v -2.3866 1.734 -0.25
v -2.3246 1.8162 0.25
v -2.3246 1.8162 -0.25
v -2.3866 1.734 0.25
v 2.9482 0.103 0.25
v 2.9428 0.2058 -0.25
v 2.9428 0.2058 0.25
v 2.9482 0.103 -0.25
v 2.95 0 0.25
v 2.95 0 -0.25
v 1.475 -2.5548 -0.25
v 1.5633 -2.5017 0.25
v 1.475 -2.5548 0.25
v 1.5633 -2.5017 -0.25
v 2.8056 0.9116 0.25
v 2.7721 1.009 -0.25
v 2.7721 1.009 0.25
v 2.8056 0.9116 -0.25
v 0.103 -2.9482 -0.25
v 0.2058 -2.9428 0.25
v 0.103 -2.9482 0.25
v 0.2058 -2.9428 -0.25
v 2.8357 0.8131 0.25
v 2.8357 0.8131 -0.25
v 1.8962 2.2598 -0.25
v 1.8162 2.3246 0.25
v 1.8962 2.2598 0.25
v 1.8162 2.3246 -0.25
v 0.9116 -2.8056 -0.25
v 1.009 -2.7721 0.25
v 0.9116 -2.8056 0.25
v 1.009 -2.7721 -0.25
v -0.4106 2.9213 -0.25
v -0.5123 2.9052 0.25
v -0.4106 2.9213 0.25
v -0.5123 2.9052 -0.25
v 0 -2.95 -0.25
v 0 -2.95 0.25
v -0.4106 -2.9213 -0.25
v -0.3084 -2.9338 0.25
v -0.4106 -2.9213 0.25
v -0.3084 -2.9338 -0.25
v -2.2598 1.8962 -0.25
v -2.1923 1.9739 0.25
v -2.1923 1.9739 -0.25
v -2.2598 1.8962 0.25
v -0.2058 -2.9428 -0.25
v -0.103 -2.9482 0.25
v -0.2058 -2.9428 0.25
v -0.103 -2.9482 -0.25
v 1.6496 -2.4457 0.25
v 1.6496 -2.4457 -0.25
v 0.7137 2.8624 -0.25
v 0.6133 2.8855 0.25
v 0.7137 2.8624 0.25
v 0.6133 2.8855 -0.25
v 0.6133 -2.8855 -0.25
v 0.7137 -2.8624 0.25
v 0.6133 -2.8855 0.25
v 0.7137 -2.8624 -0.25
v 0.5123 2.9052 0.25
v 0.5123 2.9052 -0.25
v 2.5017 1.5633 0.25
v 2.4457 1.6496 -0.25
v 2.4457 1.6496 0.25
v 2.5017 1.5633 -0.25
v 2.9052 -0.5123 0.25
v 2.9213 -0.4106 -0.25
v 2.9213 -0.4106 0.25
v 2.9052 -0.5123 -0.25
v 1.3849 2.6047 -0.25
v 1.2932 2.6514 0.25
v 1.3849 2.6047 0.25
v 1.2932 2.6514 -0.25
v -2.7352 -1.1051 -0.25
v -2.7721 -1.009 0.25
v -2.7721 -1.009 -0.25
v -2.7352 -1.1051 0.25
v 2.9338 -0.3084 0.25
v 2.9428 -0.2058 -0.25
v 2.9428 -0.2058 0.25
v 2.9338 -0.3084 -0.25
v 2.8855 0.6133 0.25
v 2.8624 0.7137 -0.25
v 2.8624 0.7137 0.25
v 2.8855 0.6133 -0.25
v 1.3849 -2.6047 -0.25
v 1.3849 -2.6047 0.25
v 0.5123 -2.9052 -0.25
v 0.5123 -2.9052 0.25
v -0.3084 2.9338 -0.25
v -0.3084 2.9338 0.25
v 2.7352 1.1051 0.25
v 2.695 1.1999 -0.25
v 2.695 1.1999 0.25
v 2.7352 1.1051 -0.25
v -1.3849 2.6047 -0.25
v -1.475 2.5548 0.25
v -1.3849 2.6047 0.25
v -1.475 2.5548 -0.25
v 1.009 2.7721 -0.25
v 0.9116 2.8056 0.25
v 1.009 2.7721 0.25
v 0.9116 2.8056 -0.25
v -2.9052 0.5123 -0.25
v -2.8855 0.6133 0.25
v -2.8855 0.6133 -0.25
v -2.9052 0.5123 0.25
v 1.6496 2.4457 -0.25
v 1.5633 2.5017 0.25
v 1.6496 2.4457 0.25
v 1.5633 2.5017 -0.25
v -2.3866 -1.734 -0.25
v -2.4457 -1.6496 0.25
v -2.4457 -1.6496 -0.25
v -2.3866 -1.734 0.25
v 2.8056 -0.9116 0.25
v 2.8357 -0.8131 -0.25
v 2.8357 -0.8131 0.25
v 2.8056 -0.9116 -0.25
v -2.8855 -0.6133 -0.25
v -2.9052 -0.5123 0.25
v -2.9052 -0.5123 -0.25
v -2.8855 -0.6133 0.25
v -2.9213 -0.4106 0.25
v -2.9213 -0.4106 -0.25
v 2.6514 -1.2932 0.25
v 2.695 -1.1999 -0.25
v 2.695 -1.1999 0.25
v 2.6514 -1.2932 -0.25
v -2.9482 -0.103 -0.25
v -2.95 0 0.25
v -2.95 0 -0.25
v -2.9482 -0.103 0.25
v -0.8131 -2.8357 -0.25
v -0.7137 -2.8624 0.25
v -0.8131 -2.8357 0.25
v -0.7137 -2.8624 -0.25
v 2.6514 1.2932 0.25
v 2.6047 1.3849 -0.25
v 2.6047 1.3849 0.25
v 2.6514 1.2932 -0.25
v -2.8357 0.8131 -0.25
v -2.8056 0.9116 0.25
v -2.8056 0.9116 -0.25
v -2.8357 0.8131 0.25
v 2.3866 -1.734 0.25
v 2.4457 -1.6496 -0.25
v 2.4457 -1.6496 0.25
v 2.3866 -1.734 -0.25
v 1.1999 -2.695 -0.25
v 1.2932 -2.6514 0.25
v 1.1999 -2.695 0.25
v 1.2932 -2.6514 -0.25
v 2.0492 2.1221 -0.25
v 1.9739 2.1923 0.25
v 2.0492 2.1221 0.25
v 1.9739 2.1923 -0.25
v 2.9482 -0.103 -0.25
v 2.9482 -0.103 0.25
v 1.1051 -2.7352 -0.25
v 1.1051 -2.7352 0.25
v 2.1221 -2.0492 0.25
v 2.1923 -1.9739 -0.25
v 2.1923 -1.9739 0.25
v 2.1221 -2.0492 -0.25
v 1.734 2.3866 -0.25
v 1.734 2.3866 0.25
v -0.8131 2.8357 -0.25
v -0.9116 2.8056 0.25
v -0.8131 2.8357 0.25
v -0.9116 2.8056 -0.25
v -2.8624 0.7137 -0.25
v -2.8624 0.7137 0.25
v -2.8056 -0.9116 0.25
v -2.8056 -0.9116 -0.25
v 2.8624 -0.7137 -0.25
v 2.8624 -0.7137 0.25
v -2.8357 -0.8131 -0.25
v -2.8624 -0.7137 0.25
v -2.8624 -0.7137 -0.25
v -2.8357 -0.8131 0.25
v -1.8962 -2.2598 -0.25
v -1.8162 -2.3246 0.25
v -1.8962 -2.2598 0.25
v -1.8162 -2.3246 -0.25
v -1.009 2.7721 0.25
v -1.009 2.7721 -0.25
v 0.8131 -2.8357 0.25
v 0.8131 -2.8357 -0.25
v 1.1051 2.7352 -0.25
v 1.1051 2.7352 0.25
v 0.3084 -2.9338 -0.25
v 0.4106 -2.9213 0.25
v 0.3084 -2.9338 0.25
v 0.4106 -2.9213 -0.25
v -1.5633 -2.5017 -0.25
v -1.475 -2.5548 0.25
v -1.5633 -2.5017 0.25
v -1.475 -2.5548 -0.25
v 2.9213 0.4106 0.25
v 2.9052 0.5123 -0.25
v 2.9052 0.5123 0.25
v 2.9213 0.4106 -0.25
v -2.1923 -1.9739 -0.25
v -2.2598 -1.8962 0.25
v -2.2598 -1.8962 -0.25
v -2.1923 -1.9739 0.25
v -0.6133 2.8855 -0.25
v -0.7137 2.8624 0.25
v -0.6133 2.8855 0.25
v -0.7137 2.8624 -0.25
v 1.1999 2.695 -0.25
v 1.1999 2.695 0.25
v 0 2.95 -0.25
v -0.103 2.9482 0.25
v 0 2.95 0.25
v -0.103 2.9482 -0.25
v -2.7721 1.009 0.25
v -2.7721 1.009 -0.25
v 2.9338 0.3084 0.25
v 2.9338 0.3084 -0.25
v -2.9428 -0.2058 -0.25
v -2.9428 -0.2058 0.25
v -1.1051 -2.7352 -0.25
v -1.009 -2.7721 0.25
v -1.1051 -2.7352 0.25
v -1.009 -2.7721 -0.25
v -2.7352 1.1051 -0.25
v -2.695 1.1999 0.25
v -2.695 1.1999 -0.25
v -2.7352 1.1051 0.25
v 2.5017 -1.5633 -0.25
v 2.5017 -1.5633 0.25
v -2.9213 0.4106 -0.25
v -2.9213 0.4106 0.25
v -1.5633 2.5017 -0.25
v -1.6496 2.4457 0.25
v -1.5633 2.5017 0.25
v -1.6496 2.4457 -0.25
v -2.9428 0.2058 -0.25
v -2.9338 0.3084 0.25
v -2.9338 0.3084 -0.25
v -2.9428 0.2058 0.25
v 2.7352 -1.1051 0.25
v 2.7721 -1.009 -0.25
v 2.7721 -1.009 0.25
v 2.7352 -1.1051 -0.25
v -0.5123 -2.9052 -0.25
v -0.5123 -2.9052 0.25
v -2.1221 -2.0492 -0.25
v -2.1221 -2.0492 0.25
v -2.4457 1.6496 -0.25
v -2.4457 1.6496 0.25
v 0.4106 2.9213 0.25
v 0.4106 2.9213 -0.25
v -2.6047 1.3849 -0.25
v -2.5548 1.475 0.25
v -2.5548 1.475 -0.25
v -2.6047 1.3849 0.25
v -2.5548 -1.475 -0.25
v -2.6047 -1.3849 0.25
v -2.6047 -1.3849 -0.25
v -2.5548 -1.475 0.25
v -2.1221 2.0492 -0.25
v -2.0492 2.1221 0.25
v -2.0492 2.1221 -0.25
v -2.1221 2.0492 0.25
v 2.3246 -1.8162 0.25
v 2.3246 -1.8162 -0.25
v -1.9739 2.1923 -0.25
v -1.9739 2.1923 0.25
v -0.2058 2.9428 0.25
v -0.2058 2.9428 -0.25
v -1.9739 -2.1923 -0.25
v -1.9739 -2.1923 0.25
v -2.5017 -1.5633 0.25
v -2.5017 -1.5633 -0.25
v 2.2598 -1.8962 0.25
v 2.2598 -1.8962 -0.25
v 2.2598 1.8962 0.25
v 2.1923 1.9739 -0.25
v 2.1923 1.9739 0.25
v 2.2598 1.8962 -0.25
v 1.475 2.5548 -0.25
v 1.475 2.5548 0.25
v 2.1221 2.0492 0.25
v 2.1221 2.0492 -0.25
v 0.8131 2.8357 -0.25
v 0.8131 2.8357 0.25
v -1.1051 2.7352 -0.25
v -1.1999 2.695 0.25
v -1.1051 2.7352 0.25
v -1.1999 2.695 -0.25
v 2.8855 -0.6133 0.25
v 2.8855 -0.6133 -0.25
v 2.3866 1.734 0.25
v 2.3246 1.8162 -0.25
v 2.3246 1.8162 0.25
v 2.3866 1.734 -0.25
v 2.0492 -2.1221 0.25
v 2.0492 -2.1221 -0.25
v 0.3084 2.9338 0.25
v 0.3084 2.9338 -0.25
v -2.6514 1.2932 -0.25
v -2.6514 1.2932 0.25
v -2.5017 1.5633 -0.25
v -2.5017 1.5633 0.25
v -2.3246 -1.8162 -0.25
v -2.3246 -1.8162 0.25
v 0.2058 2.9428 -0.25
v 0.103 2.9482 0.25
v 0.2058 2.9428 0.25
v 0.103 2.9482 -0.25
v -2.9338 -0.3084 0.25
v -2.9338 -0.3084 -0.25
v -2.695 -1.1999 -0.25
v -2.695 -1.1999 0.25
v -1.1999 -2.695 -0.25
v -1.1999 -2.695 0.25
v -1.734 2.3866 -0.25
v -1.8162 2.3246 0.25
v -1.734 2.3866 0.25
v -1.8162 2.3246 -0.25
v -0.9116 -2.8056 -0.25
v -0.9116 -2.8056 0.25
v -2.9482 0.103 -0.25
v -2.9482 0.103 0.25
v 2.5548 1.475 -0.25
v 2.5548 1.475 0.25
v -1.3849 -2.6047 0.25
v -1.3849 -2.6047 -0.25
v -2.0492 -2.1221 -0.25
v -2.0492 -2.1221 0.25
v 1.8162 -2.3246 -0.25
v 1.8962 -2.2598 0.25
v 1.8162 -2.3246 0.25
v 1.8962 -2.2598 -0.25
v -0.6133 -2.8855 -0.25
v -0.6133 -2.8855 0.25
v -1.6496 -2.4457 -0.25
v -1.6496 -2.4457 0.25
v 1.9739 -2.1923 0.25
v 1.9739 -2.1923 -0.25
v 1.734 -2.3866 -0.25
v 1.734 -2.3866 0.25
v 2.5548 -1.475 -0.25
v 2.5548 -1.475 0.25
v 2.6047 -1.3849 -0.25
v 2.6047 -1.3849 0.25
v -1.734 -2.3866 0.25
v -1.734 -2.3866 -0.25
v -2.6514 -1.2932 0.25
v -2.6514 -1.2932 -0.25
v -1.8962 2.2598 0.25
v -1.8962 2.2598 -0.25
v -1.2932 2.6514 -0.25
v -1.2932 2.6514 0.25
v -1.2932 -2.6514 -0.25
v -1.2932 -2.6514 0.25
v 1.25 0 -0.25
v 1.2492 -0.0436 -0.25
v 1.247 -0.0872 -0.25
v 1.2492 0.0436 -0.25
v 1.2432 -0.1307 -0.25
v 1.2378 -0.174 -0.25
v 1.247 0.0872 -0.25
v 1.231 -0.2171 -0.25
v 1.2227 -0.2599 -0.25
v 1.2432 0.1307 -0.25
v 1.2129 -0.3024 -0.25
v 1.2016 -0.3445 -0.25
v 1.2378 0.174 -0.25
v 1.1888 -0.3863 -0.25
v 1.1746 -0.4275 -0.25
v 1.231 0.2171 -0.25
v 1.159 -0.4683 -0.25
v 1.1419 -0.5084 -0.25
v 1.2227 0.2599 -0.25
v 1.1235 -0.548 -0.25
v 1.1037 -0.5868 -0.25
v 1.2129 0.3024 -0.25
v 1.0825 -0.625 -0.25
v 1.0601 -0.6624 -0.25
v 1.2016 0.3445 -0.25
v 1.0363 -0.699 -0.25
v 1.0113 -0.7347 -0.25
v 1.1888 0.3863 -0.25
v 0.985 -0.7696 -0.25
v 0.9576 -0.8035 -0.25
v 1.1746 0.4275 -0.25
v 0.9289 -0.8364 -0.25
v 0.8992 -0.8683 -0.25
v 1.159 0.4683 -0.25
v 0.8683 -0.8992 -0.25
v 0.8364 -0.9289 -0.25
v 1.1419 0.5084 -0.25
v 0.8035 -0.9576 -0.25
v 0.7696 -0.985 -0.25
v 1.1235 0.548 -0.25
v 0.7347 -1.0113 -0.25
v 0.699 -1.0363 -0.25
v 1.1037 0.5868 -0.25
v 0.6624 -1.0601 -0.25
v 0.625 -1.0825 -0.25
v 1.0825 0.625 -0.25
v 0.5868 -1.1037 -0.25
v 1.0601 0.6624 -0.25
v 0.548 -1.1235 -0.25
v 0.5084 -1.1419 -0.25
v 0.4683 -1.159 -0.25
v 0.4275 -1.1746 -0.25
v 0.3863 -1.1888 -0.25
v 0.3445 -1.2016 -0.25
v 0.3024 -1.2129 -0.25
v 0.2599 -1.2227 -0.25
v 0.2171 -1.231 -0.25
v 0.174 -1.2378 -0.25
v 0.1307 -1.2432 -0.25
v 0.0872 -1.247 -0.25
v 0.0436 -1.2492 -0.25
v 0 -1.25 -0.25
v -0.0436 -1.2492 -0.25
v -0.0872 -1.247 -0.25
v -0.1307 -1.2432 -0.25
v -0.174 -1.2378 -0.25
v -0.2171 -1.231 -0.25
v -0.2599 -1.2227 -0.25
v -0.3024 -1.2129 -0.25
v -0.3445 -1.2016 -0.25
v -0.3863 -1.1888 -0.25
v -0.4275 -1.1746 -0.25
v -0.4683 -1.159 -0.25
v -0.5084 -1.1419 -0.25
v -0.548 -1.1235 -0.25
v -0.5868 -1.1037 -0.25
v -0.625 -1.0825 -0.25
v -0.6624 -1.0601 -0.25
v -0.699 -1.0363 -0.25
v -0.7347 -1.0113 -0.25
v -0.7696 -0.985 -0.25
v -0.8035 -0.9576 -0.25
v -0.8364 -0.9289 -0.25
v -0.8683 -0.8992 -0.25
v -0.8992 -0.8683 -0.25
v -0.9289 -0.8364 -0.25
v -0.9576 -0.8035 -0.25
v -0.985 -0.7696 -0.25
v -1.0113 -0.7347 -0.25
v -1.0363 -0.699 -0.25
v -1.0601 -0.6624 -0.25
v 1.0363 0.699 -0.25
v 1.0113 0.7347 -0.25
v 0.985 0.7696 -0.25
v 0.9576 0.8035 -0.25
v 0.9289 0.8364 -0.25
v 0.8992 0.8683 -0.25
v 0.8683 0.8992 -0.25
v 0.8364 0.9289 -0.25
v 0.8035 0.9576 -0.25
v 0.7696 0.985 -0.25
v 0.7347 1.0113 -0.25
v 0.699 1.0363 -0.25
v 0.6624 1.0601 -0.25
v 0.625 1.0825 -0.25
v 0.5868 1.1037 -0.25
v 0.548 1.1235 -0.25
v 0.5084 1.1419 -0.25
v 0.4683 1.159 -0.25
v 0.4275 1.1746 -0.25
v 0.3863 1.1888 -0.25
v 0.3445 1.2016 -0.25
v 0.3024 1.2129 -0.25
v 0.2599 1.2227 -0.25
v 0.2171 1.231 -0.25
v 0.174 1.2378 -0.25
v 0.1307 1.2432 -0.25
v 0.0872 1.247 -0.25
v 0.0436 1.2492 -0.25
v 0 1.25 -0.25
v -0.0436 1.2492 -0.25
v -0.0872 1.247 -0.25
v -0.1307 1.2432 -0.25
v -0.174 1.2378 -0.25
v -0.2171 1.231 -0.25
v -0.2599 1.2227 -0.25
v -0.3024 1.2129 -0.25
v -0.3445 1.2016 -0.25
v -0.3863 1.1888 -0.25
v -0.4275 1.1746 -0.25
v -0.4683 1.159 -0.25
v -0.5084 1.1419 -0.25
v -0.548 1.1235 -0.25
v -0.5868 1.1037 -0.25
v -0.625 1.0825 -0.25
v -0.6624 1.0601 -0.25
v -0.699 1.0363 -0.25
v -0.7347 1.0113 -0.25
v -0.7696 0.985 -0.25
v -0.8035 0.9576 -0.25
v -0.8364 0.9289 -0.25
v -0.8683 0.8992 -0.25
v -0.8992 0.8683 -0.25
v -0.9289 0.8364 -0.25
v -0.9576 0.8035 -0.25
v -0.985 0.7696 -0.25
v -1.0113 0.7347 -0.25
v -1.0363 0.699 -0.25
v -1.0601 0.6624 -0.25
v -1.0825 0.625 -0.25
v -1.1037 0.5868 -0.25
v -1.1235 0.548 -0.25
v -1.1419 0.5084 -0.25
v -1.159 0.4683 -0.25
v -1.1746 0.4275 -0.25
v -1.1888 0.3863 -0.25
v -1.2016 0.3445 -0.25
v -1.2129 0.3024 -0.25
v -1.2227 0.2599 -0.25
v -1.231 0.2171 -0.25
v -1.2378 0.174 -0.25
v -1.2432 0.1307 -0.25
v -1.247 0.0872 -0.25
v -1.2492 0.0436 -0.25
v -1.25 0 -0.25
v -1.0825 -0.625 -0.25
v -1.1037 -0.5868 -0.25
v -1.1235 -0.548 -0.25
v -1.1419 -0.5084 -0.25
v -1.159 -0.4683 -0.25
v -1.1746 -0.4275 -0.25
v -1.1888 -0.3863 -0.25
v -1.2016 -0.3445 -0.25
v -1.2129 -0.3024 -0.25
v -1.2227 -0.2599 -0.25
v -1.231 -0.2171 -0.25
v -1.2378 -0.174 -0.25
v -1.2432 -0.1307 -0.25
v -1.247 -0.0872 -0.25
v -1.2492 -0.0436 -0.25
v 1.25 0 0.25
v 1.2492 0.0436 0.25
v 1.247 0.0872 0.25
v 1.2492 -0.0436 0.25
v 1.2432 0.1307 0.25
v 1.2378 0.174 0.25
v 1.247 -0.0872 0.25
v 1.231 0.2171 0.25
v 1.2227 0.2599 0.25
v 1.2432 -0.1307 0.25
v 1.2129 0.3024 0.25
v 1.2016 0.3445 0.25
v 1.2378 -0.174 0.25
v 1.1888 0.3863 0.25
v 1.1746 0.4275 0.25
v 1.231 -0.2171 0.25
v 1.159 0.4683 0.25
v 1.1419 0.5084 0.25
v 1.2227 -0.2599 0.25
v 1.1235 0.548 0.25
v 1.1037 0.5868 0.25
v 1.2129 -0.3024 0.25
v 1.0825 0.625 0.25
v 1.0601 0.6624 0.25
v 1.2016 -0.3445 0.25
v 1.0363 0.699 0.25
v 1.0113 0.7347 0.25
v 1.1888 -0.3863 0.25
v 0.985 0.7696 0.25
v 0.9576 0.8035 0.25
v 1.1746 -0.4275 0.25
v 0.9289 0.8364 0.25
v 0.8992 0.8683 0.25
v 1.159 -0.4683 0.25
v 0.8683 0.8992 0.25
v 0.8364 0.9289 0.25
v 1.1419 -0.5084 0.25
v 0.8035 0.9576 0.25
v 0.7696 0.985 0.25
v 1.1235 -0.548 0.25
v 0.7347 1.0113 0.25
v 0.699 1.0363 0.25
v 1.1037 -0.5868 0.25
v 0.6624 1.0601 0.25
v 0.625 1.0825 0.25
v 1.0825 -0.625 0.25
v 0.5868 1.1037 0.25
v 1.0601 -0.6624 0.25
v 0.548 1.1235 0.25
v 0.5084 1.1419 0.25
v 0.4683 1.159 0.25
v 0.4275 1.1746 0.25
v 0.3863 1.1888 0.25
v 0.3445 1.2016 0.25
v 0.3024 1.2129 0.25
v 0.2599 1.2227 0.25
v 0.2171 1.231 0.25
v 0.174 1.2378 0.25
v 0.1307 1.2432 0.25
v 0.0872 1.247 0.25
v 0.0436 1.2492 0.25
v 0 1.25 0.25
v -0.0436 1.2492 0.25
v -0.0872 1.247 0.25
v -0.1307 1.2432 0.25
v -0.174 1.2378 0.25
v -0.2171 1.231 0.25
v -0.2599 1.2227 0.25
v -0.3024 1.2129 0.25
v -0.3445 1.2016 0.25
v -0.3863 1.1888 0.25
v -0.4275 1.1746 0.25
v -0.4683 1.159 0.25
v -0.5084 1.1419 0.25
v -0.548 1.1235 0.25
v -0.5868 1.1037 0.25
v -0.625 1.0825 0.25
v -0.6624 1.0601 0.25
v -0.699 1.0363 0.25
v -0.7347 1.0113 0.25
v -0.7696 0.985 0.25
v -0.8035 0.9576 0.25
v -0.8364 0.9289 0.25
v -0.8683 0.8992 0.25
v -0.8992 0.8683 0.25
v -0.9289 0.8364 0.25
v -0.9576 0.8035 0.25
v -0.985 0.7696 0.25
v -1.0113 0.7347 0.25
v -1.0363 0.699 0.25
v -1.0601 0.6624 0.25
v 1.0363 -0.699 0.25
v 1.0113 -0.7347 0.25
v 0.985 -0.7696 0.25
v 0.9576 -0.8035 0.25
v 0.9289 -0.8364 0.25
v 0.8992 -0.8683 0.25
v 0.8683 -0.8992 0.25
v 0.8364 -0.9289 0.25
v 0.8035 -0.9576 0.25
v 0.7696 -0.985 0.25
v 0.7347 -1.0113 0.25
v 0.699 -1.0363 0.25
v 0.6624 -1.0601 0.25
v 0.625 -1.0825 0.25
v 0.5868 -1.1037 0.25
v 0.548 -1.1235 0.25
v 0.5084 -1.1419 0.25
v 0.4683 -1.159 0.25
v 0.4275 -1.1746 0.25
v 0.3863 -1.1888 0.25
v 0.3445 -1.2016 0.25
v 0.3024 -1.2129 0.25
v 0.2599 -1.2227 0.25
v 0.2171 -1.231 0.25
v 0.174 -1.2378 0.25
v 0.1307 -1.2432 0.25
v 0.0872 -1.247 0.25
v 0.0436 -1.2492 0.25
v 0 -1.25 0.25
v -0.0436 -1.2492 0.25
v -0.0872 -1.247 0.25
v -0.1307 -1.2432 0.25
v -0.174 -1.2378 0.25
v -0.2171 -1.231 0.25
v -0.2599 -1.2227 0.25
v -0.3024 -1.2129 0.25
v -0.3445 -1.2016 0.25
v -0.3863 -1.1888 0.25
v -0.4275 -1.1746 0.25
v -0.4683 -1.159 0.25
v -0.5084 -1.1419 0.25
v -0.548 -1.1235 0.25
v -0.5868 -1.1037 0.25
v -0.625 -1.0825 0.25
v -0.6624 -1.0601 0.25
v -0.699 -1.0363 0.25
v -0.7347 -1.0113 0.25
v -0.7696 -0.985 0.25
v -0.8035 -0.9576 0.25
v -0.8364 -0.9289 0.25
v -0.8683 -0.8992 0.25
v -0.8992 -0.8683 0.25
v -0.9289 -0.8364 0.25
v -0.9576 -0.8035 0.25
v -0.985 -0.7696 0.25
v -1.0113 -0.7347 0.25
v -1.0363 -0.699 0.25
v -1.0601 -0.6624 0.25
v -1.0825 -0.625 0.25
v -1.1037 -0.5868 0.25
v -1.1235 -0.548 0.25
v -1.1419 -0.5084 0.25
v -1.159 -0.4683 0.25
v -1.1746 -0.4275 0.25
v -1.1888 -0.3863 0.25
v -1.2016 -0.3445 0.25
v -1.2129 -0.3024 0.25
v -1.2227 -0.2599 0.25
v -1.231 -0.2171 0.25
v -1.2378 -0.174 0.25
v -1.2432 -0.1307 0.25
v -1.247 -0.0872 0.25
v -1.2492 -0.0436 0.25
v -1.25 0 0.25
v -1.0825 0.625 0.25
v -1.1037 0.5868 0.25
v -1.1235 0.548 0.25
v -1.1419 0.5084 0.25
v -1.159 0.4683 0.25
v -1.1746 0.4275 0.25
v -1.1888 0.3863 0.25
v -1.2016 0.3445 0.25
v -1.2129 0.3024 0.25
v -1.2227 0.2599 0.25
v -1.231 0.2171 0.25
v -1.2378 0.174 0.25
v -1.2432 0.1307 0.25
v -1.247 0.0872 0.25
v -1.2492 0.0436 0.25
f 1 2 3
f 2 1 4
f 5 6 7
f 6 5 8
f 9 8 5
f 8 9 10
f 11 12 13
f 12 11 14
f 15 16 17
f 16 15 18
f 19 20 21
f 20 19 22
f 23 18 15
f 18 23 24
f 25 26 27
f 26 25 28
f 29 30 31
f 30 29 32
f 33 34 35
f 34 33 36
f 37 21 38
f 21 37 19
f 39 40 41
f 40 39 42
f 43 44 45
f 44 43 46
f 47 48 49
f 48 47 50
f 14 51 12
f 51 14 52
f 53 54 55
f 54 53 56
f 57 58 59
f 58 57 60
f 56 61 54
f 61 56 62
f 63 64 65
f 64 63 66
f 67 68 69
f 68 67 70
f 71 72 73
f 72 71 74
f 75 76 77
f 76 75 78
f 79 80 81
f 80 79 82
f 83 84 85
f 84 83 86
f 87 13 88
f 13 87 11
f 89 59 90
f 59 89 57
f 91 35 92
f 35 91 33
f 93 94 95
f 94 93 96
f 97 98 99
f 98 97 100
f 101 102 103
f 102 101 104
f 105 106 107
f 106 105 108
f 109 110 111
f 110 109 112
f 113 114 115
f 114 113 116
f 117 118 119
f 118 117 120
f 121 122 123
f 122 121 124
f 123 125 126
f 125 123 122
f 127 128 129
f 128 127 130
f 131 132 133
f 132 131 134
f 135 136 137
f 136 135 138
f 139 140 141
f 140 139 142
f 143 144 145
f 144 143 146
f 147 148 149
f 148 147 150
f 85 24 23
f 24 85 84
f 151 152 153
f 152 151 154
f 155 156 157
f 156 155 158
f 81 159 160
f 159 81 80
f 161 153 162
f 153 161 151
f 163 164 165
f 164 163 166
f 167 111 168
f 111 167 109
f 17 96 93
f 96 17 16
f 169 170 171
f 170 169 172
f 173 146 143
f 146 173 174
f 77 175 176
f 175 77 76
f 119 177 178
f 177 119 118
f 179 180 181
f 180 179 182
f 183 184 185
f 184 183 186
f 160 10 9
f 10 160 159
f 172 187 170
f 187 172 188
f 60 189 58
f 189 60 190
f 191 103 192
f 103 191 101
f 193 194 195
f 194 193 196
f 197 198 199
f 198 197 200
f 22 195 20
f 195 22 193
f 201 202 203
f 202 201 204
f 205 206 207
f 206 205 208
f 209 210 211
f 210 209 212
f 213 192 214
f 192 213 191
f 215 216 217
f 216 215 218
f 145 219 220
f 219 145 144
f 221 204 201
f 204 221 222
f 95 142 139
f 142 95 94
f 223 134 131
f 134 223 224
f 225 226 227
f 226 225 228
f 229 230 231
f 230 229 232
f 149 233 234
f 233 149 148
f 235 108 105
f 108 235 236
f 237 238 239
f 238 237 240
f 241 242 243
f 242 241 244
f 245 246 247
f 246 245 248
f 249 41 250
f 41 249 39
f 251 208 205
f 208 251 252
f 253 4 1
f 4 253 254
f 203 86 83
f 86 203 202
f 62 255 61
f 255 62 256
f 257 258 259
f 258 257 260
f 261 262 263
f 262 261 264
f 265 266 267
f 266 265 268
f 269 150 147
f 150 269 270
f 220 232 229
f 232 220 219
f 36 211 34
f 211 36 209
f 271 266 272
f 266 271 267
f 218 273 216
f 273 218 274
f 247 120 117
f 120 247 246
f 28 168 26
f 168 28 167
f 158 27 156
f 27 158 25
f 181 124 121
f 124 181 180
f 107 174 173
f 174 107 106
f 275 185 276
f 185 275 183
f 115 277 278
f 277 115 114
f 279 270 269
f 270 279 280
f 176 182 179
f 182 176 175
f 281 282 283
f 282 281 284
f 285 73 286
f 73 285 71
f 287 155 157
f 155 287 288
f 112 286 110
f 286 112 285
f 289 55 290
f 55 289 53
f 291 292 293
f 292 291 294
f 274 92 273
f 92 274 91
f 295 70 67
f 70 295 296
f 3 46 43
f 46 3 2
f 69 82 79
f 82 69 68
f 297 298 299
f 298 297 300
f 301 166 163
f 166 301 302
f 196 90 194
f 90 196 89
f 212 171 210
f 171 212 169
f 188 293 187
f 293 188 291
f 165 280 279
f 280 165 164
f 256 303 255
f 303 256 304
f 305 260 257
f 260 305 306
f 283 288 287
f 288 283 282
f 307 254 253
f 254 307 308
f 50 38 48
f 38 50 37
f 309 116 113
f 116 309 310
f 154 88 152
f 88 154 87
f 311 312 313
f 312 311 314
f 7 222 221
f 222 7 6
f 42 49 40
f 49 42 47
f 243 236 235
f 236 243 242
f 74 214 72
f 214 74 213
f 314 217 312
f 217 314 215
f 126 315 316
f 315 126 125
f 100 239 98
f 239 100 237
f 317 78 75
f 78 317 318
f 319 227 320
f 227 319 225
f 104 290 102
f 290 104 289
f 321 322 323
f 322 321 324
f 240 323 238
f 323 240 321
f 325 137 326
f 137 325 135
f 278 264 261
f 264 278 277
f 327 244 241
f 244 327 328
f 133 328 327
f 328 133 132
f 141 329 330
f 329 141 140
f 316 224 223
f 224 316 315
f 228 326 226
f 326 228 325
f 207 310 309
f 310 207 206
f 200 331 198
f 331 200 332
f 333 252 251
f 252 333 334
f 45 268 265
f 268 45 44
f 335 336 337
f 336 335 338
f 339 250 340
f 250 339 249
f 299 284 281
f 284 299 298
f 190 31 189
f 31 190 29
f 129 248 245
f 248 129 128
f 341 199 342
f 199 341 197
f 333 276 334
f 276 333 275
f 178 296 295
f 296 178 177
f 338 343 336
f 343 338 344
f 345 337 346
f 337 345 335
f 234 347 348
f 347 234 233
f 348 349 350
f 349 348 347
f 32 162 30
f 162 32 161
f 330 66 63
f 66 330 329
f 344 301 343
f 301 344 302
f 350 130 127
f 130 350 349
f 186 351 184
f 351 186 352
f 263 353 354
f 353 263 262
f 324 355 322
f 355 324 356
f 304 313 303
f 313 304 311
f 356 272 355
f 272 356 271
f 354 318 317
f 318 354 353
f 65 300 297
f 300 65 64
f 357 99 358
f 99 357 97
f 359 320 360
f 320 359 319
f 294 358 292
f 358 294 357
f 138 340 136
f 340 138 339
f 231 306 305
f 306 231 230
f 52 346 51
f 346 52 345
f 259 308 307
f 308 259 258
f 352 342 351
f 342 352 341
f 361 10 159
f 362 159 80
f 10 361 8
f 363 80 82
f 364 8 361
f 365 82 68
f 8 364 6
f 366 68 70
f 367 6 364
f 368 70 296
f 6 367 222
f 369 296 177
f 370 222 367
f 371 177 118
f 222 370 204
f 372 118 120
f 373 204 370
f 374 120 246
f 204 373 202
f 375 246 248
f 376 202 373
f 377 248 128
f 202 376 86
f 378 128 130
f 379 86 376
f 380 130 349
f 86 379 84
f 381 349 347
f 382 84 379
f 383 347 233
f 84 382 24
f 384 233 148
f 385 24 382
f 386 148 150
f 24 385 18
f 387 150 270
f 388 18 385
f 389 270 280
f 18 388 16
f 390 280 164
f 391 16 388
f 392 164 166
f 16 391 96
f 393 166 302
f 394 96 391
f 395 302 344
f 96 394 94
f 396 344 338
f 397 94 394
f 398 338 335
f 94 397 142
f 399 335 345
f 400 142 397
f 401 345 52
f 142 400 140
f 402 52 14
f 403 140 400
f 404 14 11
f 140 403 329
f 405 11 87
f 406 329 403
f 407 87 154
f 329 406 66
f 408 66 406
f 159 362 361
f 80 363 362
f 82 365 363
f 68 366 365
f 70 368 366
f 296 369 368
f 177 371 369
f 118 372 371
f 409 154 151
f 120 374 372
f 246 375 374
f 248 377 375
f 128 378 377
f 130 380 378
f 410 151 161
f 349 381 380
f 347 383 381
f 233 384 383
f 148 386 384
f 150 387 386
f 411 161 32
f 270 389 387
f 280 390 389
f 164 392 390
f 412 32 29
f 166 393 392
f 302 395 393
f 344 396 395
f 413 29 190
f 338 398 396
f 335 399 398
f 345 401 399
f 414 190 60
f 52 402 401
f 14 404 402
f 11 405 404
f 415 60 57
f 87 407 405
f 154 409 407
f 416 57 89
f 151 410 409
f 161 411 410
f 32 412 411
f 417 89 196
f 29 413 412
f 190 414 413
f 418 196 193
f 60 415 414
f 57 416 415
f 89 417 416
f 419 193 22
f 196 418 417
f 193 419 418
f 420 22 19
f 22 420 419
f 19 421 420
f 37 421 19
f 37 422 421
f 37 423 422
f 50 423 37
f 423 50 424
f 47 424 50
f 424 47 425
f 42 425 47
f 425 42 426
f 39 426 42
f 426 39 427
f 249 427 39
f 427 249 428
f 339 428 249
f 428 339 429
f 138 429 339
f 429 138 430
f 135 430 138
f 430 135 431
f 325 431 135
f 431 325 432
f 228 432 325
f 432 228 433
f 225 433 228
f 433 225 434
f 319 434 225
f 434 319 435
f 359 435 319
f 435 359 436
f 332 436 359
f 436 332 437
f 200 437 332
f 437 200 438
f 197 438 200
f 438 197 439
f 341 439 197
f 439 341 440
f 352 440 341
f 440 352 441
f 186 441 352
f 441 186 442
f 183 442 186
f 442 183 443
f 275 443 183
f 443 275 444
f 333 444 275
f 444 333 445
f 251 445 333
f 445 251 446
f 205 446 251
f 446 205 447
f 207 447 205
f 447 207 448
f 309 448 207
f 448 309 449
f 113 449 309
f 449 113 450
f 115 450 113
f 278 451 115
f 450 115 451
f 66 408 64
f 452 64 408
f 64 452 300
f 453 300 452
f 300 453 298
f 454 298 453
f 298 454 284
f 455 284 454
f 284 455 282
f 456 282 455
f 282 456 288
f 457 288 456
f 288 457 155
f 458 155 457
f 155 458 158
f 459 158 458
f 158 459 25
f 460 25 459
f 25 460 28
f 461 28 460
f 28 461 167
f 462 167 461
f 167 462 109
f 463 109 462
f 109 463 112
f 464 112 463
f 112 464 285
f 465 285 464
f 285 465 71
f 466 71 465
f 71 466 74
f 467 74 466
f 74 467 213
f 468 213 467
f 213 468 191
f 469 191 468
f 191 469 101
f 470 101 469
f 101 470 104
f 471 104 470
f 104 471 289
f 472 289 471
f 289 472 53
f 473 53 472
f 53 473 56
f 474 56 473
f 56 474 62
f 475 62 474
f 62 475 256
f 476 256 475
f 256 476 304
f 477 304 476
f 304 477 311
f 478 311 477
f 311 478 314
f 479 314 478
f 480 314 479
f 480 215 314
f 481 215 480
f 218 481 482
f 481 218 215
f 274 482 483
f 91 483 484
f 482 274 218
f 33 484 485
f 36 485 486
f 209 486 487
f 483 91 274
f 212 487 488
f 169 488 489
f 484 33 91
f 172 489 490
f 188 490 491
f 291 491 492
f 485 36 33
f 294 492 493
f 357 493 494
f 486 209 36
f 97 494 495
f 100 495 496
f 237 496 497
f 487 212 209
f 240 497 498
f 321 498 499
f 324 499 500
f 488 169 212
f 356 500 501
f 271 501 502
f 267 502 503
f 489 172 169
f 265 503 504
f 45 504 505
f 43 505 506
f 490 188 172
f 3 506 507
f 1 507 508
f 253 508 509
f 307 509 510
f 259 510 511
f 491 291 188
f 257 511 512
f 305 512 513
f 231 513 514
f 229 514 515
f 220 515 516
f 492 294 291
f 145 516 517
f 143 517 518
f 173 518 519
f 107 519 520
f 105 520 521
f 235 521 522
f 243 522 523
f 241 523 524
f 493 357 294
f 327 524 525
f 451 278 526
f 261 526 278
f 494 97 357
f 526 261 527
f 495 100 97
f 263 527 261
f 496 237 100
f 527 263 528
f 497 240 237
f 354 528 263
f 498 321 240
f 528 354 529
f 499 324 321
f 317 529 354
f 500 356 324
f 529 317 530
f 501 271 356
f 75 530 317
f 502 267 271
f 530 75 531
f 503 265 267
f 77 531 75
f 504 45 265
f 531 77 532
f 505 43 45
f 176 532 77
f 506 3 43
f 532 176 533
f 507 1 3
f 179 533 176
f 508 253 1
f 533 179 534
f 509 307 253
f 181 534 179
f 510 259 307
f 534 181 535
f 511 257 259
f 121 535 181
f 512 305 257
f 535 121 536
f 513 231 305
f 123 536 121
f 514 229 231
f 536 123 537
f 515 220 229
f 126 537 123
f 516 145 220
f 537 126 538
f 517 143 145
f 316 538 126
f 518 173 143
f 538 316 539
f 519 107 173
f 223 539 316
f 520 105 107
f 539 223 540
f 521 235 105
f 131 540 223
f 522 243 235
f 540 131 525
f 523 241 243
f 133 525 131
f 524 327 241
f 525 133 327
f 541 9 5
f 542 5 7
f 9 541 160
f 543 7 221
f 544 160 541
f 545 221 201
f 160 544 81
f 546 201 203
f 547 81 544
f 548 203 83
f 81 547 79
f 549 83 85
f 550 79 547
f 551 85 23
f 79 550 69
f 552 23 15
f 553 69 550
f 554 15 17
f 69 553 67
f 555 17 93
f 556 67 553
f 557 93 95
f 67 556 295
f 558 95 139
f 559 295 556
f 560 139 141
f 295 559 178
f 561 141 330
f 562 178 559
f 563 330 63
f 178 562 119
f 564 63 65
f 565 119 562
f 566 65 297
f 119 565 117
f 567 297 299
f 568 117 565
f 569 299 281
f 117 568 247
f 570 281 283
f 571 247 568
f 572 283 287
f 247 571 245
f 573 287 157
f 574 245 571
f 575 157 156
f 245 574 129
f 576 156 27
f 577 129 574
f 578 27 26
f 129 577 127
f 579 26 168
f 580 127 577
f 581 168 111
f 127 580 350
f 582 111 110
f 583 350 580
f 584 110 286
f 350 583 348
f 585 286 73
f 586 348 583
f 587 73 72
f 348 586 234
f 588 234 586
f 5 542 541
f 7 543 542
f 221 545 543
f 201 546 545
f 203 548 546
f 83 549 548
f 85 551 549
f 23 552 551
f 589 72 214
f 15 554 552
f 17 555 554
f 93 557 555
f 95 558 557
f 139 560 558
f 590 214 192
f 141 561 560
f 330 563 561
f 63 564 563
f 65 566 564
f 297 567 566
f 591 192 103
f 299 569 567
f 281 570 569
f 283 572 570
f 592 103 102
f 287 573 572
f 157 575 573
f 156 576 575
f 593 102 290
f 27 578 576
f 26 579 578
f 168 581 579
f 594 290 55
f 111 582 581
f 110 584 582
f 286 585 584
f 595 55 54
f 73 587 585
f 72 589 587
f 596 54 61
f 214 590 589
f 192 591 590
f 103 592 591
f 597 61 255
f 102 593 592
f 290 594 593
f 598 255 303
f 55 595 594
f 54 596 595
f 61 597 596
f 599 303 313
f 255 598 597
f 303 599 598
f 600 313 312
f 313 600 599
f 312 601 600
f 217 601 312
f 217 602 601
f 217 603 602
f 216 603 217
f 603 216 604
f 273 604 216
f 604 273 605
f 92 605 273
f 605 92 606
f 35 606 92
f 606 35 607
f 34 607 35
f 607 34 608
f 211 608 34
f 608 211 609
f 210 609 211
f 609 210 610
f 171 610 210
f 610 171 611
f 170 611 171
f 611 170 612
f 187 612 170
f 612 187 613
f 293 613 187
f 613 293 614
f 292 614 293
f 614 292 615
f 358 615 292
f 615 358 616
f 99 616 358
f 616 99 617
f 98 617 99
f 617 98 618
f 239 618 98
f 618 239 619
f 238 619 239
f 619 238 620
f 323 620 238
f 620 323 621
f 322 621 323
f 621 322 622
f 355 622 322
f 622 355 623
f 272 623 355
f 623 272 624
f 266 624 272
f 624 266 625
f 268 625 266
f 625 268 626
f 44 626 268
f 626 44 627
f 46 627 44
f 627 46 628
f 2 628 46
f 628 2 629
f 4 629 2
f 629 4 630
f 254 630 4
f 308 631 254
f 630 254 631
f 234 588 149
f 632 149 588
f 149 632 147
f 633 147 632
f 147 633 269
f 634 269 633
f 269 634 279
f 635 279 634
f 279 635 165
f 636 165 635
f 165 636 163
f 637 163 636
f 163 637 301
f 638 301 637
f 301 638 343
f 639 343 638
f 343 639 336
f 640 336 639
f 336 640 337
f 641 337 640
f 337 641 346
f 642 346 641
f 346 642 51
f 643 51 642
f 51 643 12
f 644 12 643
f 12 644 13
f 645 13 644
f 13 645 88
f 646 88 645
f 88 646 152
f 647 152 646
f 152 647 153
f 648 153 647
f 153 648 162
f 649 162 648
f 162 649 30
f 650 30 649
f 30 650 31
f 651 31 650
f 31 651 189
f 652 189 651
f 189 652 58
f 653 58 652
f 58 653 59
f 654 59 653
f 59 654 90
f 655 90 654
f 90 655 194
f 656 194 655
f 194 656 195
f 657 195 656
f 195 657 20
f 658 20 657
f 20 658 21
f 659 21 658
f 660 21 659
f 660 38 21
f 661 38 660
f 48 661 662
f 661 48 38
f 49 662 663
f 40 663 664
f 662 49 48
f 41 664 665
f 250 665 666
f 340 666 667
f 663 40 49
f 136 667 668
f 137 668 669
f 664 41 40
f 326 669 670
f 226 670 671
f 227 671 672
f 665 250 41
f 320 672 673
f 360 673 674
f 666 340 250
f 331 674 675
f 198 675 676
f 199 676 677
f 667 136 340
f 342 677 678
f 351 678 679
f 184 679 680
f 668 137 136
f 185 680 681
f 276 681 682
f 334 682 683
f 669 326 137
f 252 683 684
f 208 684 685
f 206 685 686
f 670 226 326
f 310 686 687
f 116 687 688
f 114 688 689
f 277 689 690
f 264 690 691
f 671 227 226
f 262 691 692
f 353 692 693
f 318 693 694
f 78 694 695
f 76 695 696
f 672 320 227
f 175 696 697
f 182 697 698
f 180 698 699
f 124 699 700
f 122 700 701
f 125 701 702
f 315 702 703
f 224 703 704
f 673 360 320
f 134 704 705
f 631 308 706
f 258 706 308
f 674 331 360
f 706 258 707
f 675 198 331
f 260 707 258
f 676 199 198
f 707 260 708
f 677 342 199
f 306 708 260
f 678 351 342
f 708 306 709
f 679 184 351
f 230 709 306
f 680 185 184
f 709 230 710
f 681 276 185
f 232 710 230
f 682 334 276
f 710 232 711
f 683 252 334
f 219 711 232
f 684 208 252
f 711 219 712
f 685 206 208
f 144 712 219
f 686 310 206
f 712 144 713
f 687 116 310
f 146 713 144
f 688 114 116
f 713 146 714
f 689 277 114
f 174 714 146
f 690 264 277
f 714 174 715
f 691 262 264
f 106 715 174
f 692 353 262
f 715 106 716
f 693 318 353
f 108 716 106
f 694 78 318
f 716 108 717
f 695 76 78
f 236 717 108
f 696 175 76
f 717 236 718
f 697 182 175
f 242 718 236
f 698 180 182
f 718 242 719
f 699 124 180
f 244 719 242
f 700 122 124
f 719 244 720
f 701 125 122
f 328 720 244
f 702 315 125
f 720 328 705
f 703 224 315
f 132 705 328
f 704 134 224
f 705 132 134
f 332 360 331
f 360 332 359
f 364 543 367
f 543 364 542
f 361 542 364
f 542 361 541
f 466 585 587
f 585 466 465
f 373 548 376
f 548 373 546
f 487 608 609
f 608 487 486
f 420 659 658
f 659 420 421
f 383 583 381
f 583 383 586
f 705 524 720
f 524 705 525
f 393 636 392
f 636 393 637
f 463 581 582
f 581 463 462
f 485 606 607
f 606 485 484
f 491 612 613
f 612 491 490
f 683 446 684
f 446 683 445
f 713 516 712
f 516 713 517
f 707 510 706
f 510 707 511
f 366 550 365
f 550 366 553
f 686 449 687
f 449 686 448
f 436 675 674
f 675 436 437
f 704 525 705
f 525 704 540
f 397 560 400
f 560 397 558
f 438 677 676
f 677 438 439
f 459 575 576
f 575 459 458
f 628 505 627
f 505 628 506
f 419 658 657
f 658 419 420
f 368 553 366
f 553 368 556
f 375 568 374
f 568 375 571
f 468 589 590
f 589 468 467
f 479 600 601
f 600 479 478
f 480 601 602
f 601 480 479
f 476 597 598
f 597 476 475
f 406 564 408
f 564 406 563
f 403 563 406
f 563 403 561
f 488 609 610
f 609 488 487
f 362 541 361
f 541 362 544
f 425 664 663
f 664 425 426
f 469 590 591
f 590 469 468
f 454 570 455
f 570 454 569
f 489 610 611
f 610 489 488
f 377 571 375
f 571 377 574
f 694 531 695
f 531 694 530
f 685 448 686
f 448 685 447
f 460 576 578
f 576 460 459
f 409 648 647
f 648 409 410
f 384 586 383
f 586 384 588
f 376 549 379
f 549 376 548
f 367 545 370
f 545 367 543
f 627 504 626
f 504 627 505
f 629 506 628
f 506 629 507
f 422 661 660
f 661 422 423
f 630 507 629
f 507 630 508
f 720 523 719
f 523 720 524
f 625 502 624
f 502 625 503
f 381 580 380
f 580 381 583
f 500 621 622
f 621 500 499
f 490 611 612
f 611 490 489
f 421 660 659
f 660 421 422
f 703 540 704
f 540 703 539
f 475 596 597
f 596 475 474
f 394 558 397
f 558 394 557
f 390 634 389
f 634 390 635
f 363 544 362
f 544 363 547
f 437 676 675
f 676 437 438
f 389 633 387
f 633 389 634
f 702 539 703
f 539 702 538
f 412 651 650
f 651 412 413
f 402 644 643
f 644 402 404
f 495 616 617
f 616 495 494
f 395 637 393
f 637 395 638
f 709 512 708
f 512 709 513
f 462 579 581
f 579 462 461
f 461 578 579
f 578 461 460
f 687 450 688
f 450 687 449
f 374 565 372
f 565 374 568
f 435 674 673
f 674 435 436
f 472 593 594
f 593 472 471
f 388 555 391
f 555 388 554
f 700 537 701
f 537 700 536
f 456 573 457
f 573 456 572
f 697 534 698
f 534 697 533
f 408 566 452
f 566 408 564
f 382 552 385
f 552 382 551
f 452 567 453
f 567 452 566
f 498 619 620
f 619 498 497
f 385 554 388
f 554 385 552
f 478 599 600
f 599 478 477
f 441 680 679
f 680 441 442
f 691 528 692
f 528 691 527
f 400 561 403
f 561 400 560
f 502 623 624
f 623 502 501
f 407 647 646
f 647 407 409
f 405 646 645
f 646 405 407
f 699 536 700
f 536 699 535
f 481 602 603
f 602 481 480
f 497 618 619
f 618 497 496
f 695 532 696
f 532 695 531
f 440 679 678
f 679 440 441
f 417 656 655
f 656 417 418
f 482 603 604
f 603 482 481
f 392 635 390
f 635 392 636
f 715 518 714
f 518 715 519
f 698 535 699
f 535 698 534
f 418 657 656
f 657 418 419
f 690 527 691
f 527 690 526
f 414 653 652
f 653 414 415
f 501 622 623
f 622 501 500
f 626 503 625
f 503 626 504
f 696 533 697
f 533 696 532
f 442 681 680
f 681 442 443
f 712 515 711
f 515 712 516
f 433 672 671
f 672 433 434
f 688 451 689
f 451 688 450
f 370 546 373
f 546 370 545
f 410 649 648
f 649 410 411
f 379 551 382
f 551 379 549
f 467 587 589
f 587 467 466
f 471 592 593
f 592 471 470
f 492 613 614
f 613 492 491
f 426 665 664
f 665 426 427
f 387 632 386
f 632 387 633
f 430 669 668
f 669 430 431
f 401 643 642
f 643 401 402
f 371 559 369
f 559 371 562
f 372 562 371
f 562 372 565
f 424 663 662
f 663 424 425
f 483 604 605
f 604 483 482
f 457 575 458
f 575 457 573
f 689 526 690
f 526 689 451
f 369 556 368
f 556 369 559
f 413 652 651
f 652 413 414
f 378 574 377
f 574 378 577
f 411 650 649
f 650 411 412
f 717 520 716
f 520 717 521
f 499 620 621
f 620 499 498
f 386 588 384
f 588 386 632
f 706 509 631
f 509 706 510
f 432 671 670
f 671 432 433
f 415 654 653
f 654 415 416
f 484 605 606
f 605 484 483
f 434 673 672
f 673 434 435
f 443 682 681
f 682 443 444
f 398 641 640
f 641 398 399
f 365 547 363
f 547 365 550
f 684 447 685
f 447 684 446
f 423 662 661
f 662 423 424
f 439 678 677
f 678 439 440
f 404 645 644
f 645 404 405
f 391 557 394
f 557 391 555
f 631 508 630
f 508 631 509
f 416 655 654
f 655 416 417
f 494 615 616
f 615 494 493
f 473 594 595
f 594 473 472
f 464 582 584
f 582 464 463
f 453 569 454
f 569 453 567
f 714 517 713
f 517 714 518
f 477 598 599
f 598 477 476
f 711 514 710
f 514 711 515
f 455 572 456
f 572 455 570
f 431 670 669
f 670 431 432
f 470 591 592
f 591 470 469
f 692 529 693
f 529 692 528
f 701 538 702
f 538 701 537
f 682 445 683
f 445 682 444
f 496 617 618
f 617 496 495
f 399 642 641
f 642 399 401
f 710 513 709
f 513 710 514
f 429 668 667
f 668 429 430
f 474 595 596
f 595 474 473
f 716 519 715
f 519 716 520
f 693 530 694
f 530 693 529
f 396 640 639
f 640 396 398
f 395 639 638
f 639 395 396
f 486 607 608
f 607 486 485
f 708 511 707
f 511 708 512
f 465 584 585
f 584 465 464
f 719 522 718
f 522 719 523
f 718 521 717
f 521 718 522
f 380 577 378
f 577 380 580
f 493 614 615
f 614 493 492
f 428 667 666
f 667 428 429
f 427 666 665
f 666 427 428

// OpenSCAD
// Flat washer: 2.5mm ID, 5.9mm OD, 0.5mm thickness (single connected solid)

// Parameters
inner_diameter_mm = 2.5;
outer_diameter_mm = 5.9;
thickness_mm      = 0.5;

// Render quality (prevents faceted/polygonal look)
$fn = 180;

module washer(id=inner_diameter_mm, od=outer_diameter_mm, t=thickness_mm) {
    difference() {
        cylinder(d=od, h=t, center=true);
        cylinder(d=id, h=t + 0.2, center=true); // slight overlap to guarantee clean through-hole
    }
}

washer();
